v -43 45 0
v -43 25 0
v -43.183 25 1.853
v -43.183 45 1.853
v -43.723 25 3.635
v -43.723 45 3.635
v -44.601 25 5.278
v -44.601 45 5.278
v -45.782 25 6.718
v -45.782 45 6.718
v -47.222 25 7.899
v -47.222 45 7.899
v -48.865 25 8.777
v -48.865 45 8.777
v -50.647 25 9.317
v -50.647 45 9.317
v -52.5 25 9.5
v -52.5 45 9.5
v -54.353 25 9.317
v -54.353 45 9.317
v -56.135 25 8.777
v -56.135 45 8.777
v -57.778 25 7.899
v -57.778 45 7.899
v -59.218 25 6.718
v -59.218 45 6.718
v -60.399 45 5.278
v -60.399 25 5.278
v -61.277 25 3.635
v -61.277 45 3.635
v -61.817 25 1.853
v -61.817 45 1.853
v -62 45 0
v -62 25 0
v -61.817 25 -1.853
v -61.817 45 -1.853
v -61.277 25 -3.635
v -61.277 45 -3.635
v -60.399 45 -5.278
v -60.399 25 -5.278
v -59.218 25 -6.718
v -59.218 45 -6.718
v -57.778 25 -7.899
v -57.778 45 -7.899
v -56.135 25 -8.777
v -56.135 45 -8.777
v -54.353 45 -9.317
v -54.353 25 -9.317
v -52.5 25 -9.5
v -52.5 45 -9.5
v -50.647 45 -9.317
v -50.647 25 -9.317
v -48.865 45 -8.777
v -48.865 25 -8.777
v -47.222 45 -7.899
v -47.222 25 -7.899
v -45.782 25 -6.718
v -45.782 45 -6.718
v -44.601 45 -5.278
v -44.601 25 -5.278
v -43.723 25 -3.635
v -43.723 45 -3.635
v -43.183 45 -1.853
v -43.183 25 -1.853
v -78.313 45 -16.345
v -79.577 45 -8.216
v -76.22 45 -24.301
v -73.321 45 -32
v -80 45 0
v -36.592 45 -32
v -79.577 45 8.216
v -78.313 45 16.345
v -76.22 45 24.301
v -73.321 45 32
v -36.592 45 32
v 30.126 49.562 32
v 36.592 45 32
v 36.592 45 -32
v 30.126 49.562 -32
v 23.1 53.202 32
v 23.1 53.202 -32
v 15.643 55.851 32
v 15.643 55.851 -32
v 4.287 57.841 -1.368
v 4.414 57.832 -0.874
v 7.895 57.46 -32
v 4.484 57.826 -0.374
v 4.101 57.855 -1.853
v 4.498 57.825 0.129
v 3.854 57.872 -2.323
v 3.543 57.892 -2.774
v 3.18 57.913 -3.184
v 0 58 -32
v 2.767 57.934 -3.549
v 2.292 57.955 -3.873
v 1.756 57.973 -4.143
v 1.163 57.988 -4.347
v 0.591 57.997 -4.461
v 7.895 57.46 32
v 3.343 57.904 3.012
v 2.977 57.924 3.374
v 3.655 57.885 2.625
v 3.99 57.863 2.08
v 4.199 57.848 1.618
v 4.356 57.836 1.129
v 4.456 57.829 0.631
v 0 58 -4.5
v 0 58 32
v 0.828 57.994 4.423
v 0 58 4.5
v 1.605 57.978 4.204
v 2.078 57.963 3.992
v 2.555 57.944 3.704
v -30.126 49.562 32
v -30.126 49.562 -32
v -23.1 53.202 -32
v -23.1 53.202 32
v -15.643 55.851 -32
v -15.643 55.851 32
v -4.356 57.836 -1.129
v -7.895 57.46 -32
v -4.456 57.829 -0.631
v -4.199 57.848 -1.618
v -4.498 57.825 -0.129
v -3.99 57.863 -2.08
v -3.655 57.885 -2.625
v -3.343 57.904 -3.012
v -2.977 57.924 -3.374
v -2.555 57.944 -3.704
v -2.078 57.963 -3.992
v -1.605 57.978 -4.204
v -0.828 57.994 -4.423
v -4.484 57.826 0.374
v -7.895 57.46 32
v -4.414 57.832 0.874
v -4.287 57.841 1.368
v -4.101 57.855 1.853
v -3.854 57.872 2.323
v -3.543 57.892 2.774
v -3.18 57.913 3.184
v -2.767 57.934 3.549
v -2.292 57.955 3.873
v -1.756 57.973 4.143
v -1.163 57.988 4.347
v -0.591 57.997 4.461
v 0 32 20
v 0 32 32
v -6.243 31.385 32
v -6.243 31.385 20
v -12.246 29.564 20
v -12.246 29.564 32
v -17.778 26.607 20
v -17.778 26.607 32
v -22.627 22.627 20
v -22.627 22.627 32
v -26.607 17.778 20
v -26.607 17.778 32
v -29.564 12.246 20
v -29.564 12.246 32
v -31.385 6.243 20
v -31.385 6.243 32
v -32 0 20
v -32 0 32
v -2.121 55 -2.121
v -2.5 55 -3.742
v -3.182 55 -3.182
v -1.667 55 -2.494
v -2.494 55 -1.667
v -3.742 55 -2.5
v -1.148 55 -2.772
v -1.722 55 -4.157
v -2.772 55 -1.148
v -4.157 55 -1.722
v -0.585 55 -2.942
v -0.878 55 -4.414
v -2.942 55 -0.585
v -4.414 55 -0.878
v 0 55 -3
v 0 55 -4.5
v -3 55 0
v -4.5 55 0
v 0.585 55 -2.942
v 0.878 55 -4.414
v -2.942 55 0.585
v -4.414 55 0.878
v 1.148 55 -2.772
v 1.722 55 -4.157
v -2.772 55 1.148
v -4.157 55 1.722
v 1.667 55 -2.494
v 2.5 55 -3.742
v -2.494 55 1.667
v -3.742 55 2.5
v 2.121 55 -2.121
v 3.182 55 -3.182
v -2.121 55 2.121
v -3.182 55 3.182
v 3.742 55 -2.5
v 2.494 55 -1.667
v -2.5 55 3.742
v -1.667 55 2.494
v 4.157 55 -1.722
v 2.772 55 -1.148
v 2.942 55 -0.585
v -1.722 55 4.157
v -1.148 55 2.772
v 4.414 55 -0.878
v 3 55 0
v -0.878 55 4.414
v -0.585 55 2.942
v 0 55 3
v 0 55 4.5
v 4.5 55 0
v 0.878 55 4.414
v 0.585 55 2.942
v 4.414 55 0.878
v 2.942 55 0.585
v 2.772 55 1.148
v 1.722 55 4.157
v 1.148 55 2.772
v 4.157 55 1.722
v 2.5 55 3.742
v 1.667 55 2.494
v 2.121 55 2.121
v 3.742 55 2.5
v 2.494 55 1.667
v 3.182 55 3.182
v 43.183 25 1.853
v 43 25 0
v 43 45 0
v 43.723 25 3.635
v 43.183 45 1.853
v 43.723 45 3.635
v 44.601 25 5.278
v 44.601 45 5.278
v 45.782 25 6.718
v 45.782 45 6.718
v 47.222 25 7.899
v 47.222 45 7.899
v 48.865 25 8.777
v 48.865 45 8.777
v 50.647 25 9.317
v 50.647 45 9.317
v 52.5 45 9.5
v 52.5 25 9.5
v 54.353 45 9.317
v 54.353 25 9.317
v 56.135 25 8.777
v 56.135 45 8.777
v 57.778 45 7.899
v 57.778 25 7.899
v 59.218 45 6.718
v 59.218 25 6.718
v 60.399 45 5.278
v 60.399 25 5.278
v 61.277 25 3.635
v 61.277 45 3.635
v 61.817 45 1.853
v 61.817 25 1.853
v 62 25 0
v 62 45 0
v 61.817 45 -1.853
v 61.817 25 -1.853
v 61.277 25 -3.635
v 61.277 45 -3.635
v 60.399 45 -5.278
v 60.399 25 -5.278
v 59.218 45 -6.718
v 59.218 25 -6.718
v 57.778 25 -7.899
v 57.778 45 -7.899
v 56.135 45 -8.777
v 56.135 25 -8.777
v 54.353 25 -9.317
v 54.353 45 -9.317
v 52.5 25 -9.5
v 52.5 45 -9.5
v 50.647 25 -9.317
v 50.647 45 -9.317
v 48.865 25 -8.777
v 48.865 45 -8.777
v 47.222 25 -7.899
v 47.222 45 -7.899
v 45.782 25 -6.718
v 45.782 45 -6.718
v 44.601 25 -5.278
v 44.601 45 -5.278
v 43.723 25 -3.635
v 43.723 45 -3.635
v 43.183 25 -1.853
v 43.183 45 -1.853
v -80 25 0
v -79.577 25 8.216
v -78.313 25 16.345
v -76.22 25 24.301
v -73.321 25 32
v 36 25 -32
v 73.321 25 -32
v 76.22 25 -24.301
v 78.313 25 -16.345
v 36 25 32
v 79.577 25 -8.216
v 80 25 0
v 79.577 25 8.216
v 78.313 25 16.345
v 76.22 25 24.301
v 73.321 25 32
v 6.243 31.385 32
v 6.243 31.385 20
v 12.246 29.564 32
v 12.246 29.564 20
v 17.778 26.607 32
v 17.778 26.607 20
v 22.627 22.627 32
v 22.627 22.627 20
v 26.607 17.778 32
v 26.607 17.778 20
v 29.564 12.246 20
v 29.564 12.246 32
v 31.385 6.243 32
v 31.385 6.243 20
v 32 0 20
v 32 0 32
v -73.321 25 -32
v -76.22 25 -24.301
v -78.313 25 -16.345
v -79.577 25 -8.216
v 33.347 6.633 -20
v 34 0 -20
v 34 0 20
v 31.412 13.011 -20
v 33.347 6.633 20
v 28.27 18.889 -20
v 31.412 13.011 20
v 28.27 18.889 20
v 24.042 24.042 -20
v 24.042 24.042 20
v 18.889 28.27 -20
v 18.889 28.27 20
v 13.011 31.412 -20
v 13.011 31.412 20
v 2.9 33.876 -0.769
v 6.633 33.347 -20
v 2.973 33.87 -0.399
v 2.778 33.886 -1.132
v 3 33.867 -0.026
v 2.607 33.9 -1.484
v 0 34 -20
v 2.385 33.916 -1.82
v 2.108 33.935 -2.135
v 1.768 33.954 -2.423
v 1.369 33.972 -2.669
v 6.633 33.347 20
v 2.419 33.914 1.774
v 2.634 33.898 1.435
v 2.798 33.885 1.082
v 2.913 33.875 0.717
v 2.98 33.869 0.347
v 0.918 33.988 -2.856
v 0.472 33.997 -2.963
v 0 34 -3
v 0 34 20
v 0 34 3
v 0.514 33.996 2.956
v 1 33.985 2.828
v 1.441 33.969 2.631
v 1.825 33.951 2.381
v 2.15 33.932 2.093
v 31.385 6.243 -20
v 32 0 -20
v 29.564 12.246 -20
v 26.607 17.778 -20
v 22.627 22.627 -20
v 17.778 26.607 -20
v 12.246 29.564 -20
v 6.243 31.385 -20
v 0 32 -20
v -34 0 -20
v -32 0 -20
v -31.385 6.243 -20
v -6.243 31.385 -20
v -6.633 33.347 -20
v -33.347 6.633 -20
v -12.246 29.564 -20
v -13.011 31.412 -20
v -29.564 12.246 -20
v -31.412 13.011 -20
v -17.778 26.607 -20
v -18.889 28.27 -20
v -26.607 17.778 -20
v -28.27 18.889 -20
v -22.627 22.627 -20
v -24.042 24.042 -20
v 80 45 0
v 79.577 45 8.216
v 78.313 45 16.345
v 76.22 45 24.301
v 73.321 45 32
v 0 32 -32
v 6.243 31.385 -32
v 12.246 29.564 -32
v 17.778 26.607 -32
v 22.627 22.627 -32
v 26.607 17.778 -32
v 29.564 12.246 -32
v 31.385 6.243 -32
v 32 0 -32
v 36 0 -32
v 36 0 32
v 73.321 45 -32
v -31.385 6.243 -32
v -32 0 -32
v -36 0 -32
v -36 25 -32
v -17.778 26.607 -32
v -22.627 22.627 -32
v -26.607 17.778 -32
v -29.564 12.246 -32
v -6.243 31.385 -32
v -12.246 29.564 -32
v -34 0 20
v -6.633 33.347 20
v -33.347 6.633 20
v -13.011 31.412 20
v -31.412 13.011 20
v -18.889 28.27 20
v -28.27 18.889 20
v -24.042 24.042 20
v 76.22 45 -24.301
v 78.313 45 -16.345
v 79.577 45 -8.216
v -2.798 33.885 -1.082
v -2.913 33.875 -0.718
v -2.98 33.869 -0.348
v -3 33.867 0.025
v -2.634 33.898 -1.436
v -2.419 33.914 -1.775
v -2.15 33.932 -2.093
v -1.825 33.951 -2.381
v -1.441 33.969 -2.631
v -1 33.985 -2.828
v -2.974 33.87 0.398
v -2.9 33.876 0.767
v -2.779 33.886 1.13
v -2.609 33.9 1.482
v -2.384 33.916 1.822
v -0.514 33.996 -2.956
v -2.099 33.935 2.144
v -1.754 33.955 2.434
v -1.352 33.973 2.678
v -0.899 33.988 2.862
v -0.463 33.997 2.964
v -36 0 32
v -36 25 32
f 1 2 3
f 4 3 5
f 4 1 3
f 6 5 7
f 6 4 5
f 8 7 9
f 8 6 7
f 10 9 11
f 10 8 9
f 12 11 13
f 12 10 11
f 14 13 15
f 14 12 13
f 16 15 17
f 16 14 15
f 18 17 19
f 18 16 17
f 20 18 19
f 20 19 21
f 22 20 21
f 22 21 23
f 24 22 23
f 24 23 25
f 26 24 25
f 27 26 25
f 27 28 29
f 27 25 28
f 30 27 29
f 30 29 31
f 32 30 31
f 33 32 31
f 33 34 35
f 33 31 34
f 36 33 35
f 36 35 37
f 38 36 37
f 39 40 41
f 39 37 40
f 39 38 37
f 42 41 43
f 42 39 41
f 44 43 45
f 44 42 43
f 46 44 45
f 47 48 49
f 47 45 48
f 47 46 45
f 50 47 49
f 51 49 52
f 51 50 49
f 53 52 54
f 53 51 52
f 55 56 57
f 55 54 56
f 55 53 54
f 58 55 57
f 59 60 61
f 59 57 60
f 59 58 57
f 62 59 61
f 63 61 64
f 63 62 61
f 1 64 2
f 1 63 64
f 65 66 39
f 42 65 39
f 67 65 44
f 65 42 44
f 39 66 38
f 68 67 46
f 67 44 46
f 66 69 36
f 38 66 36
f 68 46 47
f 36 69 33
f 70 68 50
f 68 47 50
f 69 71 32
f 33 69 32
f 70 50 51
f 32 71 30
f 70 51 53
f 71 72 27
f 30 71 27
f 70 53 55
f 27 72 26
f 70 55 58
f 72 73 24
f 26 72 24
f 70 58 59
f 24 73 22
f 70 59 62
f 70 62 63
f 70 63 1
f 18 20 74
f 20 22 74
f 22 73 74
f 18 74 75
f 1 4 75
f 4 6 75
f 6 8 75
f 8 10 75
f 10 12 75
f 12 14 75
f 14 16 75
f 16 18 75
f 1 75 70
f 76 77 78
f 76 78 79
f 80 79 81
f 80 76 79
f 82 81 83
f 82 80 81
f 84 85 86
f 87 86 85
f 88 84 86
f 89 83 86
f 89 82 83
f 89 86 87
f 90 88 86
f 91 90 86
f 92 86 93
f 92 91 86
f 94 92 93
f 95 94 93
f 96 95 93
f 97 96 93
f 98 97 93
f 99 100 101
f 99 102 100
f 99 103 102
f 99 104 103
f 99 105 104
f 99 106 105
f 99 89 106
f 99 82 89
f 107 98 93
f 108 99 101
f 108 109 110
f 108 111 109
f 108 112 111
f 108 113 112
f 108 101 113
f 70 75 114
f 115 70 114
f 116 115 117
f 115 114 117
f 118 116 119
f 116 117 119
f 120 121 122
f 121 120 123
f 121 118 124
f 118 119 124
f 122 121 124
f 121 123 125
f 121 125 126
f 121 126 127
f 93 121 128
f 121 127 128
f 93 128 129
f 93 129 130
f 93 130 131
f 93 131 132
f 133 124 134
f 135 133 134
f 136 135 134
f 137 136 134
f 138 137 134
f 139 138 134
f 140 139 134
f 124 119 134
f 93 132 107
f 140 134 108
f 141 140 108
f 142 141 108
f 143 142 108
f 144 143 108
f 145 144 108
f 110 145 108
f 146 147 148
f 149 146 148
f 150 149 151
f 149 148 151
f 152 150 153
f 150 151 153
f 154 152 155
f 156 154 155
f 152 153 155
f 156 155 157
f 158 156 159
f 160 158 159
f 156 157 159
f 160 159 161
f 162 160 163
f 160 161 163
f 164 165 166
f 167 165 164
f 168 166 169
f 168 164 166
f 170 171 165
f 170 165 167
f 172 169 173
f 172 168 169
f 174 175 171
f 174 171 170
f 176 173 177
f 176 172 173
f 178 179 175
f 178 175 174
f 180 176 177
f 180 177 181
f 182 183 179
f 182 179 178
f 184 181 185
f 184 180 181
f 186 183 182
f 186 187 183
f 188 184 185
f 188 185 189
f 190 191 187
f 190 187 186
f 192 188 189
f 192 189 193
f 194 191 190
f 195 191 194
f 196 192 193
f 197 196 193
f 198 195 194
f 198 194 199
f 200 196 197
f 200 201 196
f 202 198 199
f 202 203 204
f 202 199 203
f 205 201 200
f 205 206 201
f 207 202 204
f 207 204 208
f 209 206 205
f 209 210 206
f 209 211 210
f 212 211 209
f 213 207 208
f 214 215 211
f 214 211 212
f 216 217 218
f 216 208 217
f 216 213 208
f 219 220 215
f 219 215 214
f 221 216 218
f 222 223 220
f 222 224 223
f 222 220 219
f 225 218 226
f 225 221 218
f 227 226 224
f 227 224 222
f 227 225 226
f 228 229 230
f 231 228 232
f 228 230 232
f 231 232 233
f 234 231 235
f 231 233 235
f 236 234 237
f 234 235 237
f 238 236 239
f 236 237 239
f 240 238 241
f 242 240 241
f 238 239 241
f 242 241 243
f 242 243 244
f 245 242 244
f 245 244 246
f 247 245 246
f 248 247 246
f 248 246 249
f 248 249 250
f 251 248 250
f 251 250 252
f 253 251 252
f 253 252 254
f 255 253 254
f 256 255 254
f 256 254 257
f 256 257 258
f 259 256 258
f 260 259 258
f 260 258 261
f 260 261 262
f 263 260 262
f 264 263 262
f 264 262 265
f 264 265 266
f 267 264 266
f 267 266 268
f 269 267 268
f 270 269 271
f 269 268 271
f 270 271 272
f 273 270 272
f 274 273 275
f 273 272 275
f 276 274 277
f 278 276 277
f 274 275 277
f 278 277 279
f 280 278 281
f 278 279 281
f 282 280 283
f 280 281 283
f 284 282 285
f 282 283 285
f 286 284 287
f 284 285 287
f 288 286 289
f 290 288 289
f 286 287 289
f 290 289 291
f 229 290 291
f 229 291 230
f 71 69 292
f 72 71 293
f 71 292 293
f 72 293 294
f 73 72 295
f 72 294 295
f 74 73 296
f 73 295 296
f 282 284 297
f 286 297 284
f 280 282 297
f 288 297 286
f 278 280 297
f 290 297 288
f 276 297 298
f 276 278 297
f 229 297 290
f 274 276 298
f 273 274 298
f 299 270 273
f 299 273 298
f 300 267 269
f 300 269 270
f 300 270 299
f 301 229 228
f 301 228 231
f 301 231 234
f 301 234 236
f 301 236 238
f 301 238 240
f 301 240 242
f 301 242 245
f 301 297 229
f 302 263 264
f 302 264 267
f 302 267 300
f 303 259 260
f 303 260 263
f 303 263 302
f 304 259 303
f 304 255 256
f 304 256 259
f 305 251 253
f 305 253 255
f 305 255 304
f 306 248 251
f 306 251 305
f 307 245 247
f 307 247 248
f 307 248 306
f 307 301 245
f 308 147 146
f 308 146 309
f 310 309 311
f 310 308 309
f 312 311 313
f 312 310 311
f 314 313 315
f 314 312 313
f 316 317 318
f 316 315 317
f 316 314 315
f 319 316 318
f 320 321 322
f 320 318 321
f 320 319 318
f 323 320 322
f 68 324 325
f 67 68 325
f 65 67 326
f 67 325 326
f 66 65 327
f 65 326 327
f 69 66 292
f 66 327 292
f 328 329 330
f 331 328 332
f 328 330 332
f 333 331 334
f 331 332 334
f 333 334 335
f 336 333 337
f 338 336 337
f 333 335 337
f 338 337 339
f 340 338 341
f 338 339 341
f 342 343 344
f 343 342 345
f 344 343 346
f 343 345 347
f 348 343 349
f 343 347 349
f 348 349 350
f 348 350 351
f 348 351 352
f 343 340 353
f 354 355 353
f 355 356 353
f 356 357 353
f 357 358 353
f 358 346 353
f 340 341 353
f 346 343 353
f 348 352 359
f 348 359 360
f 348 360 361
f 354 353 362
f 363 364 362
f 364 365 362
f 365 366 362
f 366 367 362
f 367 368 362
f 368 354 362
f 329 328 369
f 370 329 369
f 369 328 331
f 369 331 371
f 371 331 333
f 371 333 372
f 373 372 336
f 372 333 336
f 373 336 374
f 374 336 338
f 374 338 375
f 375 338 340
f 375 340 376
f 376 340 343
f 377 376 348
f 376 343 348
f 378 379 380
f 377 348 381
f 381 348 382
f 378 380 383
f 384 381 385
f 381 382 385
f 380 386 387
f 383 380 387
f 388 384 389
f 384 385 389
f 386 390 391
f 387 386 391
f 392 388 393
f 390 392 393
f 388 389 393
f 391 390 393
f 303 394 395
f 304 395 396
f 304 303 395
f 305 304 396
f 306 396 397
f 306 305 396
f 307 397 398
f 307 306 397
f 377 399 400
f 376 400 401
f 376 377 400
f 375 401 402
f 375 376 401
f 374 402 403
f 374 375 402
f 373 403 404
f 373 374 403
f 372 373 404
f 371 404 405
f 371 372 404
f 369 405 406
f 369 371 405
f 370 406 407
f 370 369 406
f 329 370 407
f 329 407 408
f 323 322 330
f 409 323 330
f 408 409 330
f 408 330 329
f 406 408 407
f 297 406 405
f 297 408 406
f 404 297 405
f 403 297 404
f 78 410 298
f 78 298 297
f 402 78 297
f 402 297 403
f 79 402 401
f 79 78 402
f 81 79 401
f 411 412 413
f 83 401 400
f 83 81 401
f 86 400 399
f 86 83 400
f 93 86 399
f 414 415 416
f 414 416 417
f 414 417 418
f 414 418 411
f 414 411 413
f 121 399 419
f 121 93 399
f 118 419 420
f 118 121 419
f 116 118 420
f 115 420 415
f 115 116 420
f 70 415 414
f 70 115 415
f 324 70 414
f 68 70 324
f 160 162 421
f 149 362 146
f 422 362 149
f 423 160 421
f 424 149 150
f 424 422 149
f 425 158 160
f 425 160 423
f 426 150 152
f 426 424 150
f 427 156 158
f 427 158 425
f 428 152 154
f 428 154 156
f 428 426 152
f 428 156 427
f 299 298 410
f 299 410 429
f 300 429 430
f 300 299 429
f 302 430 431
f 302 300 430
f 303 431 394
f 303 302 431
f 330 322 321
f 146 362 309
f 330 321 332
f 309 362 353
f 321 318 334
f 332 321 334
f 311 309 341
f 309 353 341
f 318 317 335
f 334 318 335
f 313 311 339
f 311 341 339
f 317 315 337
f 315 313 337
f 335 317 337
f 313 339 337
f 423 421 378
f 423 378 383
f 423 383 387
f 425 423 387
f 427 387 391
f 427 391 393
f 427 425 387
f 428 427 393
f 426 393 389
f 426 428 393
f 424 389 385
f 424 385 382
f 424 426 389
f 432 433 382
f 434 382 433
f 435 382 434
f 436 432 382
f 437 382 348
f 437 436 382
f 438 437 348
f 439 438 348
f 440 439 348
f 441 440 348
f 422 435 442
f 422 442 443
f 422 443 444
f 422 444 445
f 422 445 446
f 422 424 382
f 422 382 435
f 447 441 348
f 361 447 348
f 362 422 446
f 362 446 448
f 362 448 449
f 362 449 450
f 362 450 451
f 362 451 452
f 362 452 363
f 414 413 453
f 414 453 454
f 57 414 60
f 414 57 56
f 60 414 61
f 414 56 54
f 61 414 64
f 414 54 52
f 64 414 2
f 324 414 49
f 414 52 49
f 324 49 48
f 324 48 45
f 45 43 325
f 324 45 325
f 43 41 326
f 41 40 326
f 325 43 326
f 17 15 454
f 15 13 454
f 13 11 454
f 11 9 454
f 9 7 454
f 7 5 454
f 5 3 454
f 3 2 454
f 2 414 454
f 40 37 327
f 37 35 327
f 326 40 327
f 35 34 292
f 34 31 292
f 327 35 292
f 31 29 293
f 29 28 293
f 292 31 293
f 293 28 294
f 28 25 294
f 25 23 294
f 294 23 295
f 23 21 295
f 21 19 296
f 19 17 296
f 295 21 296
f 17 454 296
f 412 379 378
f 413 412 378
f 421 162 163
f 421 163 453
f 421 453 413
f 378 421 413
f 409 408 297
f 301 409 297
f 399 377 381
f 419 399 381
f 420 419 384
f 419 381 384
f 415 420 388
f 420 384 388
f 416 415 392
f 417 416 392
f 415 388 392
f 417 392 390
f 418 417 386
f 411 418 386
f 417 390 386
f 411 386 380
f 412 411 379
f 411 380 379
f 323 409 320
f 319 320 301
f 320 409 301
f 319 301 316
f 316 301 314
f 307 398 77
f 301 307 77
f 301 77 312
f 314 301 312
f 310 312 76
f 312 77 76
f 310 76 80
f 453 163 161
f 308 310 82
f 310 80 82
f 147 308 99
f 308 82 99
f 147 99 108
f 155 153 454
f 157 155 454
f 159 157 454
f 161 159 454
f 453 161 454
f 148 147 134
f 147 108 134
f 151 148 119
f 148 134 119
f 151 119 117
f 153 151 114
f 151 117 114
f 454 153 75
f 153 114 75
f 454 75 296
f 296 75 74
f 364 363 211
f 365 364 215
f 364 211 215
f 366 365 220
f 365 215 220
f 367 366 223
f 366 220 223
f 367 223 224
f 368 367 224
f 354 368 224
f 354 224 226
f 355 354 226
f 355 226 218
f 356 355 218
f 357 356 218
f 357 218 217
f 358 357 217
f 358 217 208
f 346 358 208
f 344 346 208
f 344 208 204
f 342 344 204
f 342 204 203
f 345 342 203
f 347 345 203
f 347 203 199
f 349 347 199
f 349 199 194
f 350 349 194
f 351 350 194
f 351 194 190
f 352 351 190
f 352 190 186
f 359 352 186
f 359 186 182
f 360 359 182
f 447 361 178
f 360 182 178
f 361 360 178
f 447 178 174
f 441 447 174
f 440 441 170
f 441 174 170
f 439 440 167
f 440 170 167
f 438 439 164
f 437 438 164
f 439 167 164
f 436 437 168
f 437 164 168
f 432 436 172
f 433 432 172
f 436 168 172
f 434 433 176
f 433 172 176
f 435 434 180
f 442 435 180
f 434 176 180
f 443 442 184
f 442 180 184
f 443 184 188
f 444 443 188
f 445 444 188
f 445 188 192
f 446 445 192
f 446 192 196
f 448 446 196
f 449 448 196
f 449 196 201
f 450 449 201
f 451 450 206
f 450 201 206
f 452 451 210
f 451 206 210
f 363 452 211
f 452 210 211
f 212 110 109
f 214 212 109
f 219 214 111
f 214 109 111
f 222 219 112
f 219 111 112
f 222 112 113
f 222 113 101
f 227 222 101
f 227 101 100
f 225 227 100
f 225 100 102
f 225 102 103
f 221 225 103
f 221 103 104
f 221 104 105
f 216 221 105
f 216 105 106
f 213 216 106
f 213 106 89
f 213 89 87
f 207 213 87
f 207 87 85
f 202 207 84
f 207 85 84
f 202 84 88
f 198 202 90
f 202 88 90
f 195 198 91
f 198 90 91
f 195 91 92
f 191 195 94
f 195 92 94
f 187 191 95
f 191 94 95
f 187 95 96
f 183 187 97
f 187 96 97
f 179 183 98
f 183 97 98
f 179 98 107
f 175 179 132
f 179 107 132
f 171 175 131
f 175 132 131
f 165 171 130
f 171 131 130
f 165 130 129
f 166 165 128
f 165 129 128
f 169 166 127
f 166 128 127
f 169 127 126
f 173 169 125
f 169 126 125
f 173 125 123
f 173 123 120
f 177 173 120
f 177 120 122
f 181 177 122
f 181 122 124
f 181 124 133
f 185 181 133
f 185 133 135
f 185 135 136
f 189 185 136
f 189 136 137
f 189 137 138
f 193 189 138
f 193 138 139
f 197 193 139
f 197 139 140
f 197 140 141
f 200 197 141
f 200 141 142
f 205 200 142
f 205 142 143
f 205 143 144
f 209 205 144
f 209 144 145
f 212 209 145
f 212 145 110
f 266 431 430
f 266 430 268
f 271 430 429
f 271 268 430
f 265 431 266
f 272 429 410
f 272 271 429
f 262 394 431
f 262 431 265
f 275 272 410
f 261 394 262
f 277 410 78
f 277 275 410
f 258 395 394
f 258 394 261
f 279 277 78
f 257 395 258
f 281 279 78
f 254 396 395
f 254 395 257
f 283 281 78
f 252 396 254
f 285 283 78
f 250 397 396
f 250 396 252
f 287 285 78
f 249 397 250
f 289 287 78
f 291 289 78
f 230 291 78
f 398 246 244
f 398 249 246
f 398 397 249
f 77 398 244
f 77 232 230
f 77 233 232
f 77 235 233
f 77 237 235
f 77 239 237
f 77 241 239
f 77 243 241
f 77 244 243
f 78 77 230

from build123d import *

# Parameters (mm, degrees)
BOSS_EXTRUDE1_DEPTH = 32
SKETCH2_R           = 9.5
CUT_EXTRUDE1_DEPTH  = 98.205966895
SKETCH3_R           = 34
CUT_EXTRUDE2_DEPTH  = 20
CUT_EXTRUDE3_START  = -20
CUT_EXTRUDE3_DEPTH  = 20
SKETCH5_R           = 4.5
CUT_EXTRUDE4_DEPTH  = 3
SKETCH6_R           = 3
CUT_EXTRUDE5_DEPTH  = 104.865297412


# Read off the part's stored shape, not the designer's step: Cut-Extrude3
with BuildPart() as part:
    # Sketch1 → Boss-Extrude1 (new, symmetric)
    with BuildSketch(Plane.XY):
        with BuildLine():
            Line((32, 0), (36, 0))
            Line((36, 0), (36, 25))
            Line((36, 25), (80, 25))
            Line((80, 25), (80, 45))
            Line((80, 45), (36.592348927, 45))
            ThreePointArc((36.592348927, 45), (19.416487839, 54.653453688), (0, 58))
            Line((0, 58), (0, 32))
            ThreePointArc((0, 32), (22.627416998, 22.627416998), (32, 0))
        make_face()
    boss_extrude1 = extrude(amount=BOSS_EXTRUDE1_DEPTH, both=True)

    # Sketch2 → Cut-Extrude1 (cut, through all)
    with BuildSketch(Plane(origin=(0, 45, 0), x_dir=(1, 0, 0), z_dir=(0, 1, 0))):
        with Locations(Location((52.5, 0, 0), (0, 0, 180))):
            Circle(SKETCH2_R)
    cut_extrude1 = extrude(amount=-CUT_EXTRUDE1_DEPTH, mode=Mode.SUBTRACT)

    # Sketch3 → Cut-Extrude2 (cut, symmetric)
    with BuildSketch(Plane.XY):
        Circle(SKETCH3_R)
    cut_extrude2 = extrude(amount=CUT_EXTRUDE2_DEPTH, both=True, mode=Mode.SUBTRACT)

    # Cut-Extrude3 outline → Cut-Extrude3 (cut)
    with BuildSketch(Plane(origin=(0, 45, 0), x_dir=(1, 0, 0), z_dir=(0, 1, 0)).offset(CUT_EXTRUDE3_START)):
        with BuildLine():
            ThreePointArc((73.321211119, 32), (78.312505014, 16.344771592), (80, 1.98e-07))
            Line((80, 1.98e-07), (80, 32))
            Line((80, 32), (73.321211119, 32))
        make_face()
        with BuildLine():
            ThreePointArc((80, 1.98e-07), (78.312505055, -16.344771398), (73.321211119, -32))
            Line((73.321211119, -32), (80, -32))
            Line((80, -32), (80, 1.98e-07))
        make_face()
    cut_extrude3 = extrude(amount=CUT_EXTRUDE3_DEPTH, mode=Mode.SUBTRACT)

    # Mirror1: Boss-Extrude1, Cut-Extrude1, Cut-Extrude2, Cut-Extrude3 across plane
    add(boss_extrude1.mirror(Plane(origin=(0, 32, 32), x_dir=(0, 0, 1), z_dir=(1, 0, 0))))
    add(cut_extrude1.mirror(Plane(origin=(0, 32, 32), x_dir=(0, 0, 1), z_dir=(1, 0, 0))), mode=Mode.SUBTRACT)
    add(cut_extrude2.mirror(Plane(origin=(0, 32, 32), x_dir=(0, 0, 1), z_dir=(1, 0, 0))), mode=Mode.SUBTRACT)
    add(cut_extrude3.mirror(Plane(origin=(0, 32, 32), x_dir=(0, 0, 1), z_dir=(1, 0, 0))), mode=Mode.SUBTRACT)

    # Sketch5 → Cut-Extrude4 (cut)
    with BuildSketch(Plane(origin=(0, 58, 0), x_dir=(1, 0, 0), z_dir=(0, 1, 0))):
        with Locations(Location((0, 0, 0), (0, 0, 270))):
            Circle(SKETCH5_R)
    extrude(amount=-CUT_EXTRUDE4_DEPTH, mode=Mode.SUBTRACT)

    # Sketch6 → Cut-Extrude5 (cut, through all)
    with BuildSketch(Plane(origin=(0, 58, 0), x_dir=(1, 0, 0), z_dir=(0, 1, 0))):
        with Locations(Location((0, 0, 0), (0, 0, 270))):
            Circle(SKETCH6_R)
    extrude(amount=-CUT_EXTRUDE5_DEPTH, mode=Mode.SUBTRACT)


solid = part.part
